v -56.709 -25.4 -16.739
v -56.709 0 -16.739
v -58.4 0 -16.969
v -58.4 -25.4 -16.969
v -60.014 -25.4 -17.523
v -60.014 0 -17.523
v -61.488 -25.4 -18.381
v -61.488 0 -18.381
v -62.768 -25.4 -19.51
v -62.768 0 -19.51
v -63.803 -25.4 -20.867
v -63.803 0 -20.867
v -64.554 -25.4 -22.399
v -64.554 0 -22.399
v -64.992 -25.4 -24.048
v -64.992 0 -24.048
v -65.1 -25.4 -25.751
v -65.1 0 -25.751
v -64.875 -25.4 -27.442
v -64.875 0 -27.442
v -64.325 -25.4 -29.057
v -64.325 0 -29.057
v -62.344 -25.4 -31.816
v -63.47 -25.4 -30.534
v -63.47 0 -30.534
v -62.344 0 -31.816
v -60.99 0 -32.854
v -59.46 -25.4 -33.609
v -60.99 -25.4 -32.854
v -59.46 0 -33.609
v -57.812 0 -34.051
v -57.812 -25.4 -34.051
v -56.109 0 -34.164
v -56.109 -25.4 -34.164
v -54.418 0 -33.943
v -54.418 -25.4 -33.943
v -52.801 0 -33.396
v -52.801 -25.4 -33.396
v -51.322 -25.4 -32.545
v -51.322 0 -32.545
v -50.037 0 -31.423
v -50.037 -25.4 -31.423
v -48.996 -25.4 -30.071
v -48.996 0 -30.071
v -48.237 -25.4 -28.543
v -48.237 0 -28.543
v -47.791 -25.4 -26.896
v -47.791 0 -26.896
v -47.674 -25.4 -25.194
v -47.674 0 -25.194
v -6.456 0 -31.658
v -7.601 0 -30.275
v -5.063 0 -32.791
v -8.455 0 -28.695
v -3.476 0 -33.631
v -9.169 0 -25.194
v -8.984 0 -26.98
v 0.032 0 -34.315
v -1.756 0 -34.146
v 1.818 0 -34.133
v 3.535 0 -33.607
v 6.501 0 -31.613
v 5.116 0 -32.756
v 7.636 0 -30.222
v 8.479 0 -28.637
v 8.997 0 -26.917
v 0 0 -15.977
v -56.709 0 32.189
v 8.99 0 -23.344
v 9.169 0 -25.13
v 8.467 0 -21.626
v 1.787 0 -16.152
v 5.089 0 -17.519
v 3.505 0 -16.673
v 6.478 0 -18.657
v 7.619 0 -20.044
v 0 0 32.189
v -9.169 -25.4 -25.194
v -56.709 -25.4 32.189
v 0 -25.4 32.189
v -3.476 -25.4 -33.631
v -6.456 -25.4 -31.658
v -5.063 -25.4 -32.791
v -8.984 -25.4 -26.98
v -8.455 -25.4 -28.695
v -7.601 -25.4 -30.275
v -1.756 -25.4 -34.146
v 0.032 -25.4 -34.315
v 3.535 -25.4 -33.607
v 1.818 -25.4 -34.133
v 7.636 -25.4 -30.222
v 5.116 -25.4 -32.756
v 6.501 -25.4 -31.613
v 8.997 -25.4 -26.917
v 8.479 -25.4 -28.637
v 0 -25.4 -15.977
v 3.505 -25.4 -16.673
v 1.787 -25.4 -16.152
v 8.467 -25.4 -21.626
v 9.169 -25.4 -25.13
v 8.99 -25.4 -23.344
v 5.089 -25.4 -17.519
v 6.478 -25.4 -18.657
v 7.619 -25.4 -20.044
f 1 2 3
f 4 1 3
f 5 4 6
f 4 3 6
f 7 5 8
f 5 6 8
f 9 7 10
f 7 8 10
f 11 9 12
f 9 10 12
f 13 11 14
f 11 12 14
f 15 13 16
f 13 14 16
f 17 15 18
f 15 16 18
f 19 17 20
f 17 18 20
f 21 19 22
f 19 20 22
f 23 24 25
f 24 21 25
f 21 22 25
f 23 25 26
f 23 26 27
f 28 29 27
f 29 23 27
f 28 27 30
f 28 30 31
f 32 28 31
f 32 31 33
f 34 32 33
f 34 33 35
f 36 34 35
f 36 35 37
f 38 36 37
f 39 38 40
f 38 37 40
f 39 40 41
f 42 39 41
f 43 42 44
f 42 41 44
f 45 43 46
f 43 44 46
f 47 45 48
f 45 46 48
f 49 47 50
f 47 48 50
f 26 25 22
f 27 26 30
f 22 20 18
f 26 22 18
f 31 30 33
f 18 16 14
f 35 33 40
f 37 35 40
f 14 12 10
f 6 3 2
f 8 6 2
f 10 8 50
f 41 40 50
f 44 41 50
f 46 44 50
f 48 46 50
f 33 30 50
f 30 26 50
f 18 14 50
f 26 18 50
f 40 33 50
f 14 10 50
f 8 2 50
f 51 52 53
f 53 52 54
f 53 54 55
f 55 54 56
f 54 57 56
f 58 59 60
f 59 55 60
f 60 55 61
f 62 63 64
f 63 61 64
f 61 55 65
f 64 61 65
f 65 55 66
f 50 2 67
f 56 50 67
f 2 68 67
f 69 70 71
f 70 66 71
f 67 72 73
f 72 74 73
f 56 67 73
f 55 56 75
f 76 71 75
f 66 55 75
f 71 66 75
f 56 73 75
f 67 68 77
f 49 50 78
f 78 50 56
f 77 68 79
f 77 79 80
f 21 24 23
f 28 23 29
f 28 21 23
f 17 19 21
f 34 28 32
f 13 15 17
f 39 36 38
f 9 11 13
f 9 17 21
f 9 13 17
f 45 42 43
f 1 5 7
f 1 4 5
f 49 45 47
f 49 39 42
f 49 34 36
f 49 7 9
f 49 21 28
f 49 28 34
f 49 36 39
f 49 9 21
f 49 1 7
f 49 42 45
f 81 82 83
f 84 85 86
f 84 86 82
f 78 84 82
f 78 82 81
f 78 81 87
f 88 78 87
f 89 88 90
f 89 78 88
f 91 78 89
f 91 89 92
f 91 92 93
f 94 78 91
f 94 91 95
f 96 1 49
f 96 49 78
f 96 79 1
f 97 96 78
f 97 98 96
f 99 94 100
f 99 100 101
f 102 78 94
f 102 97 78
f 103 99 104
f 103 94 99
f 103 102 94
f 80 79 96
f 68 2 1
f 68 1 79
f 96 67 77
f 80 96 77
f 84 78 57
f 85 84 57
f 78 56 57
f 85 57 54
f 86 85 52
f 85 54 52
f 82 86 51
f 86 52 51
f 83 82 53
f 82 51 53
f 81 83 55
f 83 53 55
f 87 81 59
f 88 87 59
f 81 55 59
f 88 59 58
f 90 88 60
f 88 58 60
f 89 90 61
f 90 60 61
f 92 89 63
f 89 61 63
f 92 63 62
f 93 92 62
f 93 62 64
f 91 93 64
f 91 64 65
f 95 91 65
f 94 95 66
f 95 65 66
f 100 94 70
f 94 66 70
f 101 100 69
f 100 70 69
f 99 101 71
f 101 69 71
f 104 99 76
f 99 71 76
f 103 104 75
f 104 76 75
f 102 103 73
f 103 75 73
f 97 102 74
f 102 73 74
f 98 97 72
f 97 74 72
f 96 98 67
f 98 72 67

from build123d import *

# Parameters (mm, degrees)
F0_W     = 56.709073
F0_H     = 57.382157
F1_DEPTH = 25.4
F2_R     = 8.717495
F2_R_2   = 9.169361
F3_DEPTH = 25.4


with BuildPart() as f1:
    # F0 (on Front) → F1 (new body)
    with BuildSketch(Plane.XZ):
        with Locations((-28.354536, 3.497539)):
            Rectangle(F0_W, F0_H)
    extrude(amount=F1_DEPTH)

    # F2 (on Front) → F3 (join)
    with BuildSketch(Plane.XZ):
        with Locations((-56.388002, -25.4508)):
            Circle(F2_R)
        with Locations((0, -25.146002)):
            Circle(F2_R_2)
    extrude(amount=F3_DEPTH)


solid = f1.part
